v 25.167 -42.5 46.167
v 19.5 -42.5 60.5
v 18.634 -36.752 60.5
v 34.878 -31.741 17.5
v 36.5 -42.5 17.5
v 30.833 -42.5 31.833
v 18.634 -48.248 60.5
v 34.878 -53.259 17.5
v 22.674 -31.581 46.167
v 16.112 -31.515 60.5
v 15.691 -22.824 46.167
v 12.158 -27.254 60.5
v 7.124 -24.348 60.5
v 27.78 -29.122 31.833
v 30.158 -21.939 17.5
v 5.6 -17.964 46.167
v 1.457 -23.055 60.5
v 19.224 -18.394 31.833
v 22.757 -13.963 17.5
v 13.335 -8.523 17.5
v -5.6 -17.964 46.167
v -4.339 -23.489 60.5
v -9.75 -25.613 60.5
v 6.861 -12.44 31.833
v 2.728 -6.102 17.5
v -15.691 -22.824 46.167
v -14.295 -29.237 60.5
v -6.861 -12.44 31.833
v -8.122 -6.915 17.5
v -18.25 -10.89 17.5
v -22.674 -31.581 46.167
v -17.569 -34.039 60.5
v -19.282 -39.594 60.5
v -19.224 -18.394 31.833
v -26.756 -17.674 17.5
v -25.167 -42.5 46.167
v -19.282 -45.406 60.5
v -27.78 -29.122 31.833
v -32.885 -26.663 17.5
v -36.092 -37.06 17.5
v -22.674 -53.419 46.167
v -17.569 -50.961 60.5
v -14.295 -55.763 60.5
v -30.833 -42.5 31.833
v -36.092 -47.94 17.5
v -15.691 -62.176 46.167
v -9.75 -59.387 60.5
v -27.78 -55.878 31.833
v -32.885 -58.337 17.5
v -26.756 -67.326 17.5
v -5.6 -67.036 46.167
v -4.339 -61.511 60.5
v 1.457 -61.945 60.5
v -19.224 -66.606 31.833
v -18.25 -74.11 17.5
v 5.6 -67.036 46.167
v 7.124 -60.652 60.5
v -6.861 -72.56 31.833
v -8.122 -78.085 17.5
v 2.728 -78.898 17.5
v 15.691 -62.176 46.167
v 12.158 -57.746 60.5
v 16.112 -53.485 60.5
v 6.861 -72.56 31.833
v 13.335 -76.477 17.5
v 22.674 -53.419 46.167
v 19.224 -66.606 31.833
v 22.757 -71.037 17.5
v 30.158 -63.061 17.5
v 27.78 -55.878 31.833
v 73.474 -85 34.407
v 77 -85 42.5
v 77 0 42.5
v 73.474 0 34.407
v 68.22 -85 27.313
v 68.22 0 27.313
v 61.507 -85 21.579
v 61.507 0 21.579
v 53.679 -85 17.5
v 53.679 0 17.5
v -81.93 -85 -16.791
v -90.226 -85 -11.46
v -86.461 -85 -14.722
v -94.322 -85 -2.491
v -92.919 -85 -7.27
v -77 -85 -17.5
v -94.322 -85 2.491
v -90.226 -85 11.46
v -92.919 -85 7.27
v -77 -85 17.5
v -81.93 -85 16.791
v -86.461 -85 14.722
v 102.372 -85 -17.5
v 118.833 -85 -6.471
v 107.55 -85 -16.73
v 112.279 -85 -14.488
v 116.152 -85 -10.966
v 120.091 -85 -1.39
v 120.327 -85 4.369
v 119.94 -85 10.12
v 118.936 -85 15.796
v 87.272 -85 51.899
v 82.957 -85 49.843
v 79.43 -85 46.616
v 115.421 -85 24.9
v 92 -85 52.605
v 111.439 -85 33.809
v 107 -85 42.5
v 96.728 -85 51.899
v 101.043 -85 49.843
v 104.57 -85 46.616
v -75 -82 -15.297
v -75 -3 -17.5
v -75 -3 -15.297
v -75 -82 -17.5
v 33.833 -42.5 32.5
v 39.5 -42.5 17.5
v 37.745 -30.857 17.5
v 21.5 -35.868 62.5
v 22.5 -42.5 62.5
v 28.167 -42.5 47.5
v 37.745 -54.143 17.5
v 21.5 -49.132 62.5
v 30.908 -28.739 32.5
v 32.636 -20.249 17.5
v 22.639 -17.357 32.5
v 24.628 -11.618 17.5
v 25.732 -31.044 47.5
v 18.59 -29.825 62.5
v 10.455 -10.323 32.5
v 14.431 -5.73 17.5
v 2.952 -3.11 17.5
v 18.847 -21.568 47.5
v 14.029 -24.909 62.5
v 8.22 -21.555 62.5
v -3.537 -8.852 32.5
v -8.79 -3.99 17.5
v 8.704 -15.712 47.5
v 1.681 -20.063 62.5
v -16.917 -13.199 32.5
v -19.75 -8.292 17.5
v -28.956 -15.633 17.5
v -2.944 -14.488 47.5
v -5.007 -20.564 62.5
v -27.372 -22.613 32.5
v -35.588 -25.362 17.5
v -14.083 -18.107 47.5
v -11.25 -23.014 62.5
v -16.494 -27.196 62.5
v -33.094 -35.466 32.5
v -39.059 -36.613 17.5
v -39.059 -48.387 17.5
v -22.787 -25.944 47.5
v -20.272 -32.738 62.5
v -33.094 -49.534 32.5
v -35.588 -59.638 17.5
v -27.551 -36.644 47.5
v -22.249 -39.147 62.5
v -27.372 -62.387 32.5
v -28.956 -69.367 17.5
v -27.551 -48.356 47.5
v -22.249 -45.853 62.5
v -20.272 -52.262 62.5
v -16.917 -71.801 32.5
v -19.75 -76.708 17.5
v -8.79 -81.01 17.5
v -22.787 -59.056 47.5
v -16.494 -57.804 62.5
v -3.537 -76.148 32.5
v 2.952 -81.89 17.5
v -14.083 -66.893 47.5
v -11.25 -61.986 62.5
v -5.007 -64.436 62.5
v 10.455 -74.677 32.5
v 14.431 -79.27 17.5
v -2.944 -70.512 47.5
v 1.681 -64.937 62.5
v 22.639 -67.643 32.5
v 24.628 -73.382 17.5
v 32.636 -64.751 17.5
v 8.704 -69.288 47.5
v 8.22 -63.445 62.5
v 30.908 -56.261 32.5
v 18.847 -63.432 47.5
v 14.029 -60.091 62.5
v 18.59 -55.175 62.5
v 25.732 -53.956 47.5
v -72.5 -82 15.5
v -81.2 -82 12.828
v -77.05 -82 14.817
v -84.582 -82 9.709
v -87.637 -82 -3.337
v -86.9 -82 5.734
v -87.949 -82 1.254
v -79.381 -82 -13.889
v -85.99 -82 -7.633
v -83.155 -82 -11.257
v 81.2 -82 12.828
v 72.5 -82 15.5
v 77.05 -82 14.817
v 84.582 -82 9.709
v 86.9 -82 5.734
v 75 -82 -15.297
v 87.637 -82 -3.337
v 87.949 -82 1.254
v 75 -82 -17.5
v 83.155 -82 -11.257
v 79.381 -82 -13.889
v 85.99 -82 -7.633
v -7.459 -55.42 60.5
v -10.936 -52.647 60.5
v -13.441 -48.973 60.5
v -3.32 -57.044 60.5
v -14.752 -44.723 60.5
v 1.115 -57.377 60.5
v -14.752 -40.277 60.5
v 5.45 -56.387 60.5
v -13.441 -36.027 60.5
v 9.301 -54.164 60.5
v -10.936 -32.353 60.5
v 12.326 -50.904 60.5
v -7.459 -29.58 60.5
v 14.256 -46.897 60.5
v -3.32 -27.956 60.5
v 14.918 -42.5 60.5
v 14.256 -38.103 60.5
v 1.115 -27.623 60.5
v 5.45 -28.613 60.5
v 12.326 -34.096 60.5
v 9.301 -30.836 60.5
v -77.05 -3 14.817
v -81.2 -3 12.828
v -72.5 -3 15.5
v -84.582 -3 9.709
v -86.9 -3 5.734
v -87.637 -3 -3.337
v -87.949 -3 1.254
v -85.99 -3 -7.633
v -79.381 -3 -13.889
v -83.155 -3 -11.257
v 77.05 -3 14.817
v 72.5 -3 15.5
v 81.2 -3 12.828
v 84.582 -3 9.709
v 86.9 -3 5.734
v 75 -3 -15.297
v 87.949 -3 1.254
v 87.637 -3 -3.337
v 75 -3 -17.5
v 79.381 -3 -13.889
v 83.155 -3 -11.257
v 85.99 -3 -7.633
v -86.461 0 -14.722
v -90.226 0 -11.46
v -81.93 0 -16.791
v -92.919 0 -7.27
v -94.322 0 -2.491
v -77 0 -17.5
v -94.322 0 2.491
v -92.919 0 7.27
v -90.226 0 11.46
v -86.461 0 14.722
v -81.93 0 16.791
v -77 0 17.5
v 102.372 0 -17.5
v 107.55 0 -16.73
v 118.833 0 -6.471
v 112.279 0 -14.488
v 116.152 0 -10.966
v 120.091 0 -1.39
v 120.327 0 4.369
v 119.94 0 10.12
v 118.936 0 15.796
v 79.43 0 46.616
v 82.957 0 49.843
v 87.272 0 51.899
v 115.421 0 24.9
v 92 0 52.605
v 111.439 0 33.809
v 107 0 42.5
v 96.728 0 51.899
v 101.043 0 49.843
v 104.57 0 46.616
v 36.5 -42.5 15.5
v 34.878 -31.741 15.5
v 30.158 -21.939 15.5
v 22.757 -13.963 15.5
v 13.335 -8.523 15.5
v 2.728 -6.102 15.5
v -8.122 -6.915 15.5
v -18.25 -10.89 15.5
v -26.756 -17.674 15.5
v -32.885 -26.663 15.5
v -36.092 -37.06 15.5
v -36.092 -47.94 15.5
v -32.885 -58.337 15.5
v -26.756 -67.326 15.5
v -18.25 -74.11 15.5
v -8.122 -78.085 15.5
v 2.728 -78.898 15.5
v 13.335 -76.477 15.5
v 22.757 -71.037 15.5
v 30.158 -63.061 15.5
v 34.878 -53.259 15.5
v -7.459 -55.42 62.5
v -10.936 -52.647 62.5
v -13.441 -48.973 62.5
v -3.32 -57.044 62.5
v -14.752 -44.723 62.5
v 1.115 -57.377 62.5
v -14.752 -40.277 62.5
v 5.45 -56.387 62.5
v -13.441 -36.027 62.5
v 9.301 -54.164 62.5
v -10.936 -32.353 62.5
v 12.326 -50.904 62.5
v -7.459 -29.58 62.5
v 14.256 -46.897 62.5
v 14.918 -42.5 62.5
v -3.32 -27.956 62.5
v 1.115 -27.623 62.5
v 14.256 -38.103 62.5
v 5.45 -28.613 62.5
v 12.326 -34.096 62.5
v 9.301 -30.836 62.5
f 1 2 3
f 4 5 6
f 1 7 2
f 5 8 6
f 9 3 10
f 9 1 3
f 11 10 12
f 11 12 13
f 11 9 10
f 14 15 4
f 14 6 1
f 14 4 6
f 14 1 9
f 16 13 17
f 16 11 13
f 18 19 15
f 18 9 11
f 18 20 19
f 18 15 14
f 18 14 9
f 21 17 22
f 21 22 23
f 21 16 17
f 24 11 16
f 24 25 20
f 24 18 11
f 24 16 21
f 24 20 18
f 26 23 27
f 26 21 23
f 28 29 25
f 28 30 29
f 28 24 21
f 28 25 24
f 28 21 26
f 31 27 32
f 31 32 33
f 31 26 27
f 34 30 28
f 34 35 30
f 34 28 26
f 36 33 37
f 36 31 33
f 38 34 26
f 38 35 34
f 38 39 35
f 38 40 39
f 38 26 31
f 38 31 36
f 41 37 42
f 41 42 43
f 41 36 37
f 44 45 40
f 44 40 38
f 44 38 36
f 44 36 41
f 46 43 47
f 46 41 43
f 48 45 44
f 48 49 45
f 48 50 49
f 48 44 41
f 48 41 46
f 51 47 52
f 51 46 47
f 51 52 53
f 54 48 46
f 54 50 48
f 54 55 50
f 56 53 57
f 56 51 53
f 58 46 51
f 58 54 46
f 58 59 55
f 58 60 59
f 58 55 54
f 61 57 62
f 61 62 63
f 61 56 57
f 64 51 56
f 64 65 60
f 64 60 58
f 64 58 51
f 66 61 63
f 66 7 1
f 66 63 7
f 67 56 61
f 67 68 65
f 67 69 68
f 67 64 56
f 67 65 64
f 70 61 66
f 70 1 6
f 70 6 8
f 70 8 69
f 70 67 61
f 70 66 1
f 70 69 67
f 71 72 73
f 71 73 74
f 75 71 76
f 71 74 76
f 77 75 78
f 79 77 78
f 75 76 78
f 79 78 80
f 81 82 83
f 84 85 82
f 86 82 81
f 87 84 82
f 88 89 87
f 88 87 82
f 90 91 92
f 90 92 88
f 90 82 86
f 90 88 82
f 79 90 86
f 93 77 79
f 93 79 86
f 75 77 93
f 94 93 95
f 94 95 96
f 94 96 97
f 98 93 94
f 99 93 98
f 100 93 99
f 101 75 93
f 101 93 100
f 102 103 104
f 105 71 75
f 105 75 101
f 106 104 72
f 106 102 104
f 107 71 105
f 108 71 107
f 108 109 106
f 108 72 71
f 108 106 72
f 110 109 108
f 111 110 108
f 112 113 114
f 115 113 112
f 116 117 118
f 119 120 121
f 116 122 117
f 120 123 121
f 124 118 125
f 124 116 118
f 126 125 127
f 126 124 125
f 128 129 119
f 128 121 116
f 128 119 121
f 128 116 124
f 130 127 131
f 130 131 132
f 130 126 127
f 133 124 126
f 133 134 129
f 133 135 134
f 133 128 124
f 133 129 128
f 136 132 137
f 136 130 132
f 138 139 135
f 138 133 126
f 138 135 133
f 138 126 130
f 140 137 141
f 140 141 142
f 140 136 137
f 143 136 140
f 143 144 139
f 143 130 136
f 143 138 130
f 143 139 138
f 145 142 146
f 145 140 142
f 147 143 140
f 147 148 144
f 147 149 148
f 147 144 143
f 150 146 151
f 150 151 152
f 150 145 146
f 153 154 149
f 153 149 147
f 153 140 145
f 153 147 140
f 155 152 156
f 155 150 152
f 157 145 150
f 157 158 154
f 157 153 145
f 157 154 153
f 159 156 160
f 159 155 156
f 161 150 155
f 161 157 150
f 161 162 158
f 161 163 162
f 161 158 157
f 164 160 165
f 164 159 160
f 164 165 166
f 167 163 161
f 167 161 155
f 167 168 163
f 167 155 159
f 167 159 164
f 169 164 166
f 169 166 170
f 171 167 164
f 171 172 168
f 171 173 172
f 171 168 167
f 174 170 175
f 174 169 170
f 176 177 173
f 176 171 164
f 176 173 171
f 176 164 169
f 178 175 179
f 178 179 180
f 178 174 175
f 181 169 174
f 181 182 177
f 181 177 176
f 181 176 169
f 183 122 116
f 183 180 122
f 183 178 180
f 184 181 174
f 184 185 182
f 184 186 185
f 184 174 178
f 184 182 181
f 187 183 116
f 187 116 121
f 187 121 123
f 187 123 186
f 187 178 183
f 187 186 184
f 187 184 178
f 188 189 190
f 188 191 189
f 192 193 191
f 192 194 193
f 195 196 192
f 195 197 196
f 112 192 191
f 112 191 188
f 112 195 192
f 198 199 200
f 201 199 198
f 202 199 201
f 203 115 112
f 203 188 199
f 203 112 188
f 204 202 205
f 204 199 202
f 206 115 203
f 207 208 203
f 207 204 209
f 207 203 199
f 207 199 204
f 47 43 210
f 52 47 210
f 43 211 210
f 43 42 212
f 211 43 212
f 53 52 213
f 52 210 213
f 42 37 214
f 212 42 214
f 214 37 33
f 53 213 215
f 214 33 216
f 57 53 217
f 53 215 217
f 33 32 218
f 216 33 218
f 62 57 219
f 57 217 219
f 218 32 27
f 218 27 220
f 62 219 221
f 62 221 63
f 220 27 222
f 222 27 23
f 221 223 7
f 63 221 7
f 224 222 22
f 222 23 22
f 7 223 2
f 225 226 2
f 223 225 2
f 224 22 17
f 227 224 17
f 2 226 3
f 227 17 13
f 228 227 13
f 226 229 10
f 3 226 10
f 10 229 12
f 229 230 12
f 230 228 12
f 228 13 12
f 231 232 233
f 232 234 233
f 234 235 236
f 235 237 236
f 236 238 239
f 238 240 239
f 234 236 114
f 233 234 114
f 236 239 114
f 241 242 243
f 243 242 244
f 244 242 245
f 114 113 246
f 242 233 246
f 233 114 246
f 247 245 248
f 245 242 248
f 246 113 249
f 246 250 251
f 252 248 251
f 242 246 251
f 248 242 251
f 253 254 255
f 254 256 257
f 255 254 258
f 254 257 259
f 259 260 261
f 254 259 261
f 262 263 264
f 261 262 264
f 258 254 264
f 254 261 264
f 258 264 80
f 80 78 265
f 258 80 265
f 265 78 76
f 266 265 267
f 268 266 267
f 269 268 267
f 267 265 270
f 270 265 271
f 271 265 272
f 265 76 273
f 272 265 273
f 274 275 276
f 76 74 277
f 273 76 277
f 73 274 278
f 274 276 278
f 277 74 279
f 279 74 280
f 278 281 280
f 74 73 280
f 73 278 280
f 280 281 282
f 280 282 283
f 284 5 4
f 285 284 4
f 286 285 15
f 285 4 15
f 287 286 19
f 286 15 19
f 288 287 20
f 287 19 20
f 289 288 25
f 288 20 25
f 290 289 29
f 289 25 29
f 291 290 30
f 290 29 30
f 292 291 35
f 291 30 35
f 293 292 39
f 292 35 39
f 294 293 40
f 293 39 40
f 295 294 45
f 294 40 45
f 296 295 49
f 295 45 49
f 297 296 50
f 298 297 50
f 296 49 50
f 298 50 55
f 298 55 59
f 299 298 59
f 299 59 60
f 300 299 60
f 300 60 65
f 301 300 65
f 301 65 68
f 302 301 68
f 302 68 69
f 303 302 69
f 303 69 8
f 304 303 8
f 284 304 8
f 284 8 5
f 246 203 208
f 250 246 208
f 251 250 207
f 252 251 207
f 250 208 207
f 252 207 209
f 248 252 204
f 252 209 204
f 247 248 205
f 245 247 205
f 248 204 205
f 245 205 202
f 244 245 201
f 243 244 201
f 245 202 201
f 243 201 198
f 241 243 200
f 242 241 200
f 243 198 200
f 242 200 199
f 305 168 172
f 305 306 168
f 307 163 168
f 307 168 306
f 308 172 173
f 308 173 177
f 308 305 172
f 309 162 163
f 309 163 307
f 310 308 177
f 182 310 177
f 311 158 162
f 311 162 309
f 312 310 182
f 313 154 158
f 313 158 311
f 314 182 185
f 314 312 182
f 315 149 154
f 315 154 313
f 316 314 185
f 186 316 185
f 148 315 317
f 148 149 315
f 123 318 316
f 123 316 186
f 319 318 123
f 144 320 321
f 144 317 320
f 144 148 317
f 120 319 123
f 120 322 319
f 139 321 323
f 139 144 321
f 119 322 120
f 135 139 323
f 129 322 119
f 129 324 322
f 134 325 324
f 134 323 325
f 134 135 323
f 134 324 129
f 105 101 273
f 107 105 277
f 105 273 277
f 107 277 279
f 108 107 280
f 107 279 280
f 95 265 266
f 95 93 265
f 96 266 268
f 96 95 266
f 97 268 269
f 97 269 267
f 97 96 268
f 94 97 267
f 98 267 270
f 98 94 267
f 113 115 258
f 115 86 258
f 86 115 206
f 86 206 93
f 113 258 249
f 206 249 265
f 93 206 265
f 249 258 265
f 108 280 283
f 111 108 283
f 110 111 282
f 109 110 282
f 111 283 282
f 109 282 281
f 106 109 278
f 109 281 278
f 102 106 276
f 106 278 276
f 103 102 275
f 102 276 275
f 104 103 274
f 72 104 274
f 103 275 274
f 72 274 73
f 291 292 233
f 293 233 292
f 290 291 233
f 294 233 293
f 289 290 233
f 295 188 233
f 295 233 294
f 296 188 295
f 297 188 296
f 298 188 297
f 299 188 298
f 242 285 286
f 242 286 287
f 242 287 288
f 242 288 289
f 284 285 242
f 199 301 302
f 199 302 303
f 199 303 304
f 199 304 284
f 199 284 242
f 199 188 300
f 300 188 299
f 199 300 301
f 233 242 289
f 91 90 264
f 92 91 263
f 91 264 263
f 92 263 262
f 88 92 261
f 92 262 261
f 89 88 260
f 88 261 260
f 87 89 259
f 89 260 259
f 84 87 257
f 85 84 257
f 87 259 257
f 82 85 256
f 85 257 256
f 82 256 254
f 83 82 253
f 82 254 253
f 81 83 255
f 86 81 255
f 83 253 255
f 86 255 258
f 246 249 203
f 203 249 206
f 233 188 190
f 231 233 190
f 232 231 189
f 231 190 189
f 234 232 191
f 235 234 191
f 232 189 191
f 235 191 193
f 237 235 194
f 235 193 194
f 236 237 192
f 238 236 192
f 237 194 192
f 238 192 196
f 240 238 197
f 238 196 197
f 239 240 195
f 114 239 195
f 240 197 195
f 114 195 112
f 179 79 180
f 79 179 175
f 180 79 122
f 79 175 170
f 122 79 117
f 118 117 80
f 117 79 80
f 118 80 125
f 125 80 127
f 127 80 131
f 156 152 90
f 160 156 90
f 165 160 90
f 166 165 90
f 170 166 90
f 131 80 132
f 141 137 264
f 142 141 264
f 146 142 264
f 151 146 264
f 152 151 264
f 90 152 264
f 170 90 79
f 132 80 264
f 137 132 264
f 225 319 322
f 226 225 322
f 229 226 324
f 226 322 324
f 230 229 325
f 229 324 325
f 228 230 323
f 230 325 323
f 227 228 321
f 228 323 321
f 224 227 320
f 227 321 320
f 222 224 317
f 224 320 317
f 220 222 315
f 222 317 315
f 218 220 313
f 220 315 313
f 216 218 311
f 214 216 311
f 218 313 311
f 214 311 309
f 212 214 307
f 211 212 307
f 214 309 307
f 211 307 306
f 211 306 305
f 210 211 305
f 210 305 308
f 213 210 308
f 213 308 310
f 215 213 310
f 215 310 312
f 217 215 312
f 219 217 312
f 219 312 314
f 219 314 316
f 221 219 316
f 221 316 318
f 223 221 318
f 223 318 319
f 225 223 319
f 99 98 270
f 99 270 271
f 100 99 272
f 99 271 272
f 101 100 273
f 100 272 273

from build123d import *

# Parameters (mm, degrees)
F1_DEPTH  = 85
F2_W      = 145
F2_H      = 31
F3_DEPTH  = 82
F5_DEPTH  = 3
F6_R      = 36.5
F7_DEPTH  = 25
F8_W      = 150
F8_H      = 79
F9_DEPTH  = 25
F12_R     = 39.5
F11_R     = 22.5
F15_R     = 19.5
F16_R     = 36.5
F18_R     = 14.9183969034
F19_DEPTH = 25
F20_R     = 17.7986384492


with BuildPart() as f1:
    # F0 (on Front) → F1 (new body)
    with BuildSketch(Plane.XZ):
        with BuildLine():
            Line((53.6785274744, 17.5), (-77, 17.5))
            ThreePointArc((-77, 17.5), (-94.5, 0), (-77, -17.5))
            Line((-77, -17.5), (107, -17.5))
            Line((107, -17.5), (115.9520000219, -17.5))
            ThreePointArc((115.9520000219, -17.5), (120.1181090792, -1.0918428156), (118.9363524318, 15.7956536859))
            ThreePointArc((118.9363524318, 15.7956536859), (113.4877587414, 29.3800706908), (107, 42.5))
            ThreePointArc((107, 42.5), (92, 52.605015692), (77, 42.5))
            ThreePointArc((77, 42.5), (68.2201693479, 27.312521558), (53.6785274744, 17.5))
        make_face()
    extrude(amount=F1_DEPTH)

    # F2 (on face) → F3 (cut)
    with BuildSketch(Plane.XZ.offset(85)):
        Rectangle(F2_W, F2_H)
        with BuildLine():
            ThreePointArc((72.5, -15.5), (88, 0), (72.5, 15.5))
            Line((72.5, 15.5), (72.5, -15.5))
        make_face()
        with BuildLine():
            Line((-72.5, -15.5), (-72.5, 15.5))
            ThreePointArc((-72.5, 15.5), (-88, 0), (-72.5, -15.5))
        make_face()
    extrude(amount=-F3_DEPTH, mode=Mode.SUBTRACT)

    # F4 (on face) → F5 (join)
    with BuildSketch(Plane.XZ.offset(85)):
        Polygon((-80.3302004933, 15.8144365996), (-89.8194238544, 7.0904721506), (-91.0138636827, 2.9792727437), (-88.2837101817, -7.9413596541), (-85.0075185299, -14.220722951), (-77, -16.4173003286), (74.3856430054, -16.4173003286), (83.1666067243, -15.5), (93.1773036718, -10.9323309734), (95.8332046866, 5.4116621614), (83.1666067243, 16.6404508054), (67.7867159247, 16.6404508054), (-69.6145296097, 16.6404508054), align=None)
    extrude(amount=-F5_DEPTH)

    # F6 (on face) → F7 (cut)
    with BuildSketch(Plane.XY.offset(17.5)):
        with Locations((0, -42.5)):
            Circle(F6_R)
    extrude(amount=-F7_DEPTH, mode=Mode.SUBTRACT)

    # F8 (on face) → F9 (cut)
    with BuildSketch(Plane(origin=(0, 0, -17.5), x_dir=(1, 0, 0), z_dir=(0, 0, -1))):
        with Locations((0, 42.5)):
            Rectangle(F8_W, F8_H)
    extrude(amount=-F9_DEPTH, mode=Mode.SUBTRACT)

    # F12 (on face) → F13 section 0
    with BuildSketch(Plane.XY.offset(17.5)):
        with Locations((0, -42.5)):
            Circle(F12_R)
    # F11 (on offset) → F13 section 1
    with BuildSketch(Plane.XY.offset(62.5)):
        with Locations((0, -42.5)):
            Circle(F11_R)
    loft()

    # F15 (on offset) → F17 section 0
    with BuildSketch(Plane.XY.offset(60.5)):
        with Locations((0, -42.5)):
            Circle(F15_R)
    # F16 (on face) → F17 section 1
    with BuildSketch(Plane(origin=(0, 0, 17.5), x_dir=(1, 0, 0), z_dir=(0, 0, -1))):
        with Locations((0, 42.5)):
            Circle(F16_R)
    loft(mode=Mode.SUBTRACT)

    # F18 (on face) → F19 (cut)
    with BuildSketch(Plane.XY.offset(62.5)):
        with Locations((0, -42.5)):
            Circle(F18_R)
    extrude(amount=-F19_DEPTH, mode=Mode.SUBTRACT)

    # F20
    f20_edges = [f1.edges().sort_by_distance(p)[0] for p in [
        (115.952, -42.5, -17.5),
    ]]
    fillet(f20_edges, radius=F20_R)


solid = f1.part
